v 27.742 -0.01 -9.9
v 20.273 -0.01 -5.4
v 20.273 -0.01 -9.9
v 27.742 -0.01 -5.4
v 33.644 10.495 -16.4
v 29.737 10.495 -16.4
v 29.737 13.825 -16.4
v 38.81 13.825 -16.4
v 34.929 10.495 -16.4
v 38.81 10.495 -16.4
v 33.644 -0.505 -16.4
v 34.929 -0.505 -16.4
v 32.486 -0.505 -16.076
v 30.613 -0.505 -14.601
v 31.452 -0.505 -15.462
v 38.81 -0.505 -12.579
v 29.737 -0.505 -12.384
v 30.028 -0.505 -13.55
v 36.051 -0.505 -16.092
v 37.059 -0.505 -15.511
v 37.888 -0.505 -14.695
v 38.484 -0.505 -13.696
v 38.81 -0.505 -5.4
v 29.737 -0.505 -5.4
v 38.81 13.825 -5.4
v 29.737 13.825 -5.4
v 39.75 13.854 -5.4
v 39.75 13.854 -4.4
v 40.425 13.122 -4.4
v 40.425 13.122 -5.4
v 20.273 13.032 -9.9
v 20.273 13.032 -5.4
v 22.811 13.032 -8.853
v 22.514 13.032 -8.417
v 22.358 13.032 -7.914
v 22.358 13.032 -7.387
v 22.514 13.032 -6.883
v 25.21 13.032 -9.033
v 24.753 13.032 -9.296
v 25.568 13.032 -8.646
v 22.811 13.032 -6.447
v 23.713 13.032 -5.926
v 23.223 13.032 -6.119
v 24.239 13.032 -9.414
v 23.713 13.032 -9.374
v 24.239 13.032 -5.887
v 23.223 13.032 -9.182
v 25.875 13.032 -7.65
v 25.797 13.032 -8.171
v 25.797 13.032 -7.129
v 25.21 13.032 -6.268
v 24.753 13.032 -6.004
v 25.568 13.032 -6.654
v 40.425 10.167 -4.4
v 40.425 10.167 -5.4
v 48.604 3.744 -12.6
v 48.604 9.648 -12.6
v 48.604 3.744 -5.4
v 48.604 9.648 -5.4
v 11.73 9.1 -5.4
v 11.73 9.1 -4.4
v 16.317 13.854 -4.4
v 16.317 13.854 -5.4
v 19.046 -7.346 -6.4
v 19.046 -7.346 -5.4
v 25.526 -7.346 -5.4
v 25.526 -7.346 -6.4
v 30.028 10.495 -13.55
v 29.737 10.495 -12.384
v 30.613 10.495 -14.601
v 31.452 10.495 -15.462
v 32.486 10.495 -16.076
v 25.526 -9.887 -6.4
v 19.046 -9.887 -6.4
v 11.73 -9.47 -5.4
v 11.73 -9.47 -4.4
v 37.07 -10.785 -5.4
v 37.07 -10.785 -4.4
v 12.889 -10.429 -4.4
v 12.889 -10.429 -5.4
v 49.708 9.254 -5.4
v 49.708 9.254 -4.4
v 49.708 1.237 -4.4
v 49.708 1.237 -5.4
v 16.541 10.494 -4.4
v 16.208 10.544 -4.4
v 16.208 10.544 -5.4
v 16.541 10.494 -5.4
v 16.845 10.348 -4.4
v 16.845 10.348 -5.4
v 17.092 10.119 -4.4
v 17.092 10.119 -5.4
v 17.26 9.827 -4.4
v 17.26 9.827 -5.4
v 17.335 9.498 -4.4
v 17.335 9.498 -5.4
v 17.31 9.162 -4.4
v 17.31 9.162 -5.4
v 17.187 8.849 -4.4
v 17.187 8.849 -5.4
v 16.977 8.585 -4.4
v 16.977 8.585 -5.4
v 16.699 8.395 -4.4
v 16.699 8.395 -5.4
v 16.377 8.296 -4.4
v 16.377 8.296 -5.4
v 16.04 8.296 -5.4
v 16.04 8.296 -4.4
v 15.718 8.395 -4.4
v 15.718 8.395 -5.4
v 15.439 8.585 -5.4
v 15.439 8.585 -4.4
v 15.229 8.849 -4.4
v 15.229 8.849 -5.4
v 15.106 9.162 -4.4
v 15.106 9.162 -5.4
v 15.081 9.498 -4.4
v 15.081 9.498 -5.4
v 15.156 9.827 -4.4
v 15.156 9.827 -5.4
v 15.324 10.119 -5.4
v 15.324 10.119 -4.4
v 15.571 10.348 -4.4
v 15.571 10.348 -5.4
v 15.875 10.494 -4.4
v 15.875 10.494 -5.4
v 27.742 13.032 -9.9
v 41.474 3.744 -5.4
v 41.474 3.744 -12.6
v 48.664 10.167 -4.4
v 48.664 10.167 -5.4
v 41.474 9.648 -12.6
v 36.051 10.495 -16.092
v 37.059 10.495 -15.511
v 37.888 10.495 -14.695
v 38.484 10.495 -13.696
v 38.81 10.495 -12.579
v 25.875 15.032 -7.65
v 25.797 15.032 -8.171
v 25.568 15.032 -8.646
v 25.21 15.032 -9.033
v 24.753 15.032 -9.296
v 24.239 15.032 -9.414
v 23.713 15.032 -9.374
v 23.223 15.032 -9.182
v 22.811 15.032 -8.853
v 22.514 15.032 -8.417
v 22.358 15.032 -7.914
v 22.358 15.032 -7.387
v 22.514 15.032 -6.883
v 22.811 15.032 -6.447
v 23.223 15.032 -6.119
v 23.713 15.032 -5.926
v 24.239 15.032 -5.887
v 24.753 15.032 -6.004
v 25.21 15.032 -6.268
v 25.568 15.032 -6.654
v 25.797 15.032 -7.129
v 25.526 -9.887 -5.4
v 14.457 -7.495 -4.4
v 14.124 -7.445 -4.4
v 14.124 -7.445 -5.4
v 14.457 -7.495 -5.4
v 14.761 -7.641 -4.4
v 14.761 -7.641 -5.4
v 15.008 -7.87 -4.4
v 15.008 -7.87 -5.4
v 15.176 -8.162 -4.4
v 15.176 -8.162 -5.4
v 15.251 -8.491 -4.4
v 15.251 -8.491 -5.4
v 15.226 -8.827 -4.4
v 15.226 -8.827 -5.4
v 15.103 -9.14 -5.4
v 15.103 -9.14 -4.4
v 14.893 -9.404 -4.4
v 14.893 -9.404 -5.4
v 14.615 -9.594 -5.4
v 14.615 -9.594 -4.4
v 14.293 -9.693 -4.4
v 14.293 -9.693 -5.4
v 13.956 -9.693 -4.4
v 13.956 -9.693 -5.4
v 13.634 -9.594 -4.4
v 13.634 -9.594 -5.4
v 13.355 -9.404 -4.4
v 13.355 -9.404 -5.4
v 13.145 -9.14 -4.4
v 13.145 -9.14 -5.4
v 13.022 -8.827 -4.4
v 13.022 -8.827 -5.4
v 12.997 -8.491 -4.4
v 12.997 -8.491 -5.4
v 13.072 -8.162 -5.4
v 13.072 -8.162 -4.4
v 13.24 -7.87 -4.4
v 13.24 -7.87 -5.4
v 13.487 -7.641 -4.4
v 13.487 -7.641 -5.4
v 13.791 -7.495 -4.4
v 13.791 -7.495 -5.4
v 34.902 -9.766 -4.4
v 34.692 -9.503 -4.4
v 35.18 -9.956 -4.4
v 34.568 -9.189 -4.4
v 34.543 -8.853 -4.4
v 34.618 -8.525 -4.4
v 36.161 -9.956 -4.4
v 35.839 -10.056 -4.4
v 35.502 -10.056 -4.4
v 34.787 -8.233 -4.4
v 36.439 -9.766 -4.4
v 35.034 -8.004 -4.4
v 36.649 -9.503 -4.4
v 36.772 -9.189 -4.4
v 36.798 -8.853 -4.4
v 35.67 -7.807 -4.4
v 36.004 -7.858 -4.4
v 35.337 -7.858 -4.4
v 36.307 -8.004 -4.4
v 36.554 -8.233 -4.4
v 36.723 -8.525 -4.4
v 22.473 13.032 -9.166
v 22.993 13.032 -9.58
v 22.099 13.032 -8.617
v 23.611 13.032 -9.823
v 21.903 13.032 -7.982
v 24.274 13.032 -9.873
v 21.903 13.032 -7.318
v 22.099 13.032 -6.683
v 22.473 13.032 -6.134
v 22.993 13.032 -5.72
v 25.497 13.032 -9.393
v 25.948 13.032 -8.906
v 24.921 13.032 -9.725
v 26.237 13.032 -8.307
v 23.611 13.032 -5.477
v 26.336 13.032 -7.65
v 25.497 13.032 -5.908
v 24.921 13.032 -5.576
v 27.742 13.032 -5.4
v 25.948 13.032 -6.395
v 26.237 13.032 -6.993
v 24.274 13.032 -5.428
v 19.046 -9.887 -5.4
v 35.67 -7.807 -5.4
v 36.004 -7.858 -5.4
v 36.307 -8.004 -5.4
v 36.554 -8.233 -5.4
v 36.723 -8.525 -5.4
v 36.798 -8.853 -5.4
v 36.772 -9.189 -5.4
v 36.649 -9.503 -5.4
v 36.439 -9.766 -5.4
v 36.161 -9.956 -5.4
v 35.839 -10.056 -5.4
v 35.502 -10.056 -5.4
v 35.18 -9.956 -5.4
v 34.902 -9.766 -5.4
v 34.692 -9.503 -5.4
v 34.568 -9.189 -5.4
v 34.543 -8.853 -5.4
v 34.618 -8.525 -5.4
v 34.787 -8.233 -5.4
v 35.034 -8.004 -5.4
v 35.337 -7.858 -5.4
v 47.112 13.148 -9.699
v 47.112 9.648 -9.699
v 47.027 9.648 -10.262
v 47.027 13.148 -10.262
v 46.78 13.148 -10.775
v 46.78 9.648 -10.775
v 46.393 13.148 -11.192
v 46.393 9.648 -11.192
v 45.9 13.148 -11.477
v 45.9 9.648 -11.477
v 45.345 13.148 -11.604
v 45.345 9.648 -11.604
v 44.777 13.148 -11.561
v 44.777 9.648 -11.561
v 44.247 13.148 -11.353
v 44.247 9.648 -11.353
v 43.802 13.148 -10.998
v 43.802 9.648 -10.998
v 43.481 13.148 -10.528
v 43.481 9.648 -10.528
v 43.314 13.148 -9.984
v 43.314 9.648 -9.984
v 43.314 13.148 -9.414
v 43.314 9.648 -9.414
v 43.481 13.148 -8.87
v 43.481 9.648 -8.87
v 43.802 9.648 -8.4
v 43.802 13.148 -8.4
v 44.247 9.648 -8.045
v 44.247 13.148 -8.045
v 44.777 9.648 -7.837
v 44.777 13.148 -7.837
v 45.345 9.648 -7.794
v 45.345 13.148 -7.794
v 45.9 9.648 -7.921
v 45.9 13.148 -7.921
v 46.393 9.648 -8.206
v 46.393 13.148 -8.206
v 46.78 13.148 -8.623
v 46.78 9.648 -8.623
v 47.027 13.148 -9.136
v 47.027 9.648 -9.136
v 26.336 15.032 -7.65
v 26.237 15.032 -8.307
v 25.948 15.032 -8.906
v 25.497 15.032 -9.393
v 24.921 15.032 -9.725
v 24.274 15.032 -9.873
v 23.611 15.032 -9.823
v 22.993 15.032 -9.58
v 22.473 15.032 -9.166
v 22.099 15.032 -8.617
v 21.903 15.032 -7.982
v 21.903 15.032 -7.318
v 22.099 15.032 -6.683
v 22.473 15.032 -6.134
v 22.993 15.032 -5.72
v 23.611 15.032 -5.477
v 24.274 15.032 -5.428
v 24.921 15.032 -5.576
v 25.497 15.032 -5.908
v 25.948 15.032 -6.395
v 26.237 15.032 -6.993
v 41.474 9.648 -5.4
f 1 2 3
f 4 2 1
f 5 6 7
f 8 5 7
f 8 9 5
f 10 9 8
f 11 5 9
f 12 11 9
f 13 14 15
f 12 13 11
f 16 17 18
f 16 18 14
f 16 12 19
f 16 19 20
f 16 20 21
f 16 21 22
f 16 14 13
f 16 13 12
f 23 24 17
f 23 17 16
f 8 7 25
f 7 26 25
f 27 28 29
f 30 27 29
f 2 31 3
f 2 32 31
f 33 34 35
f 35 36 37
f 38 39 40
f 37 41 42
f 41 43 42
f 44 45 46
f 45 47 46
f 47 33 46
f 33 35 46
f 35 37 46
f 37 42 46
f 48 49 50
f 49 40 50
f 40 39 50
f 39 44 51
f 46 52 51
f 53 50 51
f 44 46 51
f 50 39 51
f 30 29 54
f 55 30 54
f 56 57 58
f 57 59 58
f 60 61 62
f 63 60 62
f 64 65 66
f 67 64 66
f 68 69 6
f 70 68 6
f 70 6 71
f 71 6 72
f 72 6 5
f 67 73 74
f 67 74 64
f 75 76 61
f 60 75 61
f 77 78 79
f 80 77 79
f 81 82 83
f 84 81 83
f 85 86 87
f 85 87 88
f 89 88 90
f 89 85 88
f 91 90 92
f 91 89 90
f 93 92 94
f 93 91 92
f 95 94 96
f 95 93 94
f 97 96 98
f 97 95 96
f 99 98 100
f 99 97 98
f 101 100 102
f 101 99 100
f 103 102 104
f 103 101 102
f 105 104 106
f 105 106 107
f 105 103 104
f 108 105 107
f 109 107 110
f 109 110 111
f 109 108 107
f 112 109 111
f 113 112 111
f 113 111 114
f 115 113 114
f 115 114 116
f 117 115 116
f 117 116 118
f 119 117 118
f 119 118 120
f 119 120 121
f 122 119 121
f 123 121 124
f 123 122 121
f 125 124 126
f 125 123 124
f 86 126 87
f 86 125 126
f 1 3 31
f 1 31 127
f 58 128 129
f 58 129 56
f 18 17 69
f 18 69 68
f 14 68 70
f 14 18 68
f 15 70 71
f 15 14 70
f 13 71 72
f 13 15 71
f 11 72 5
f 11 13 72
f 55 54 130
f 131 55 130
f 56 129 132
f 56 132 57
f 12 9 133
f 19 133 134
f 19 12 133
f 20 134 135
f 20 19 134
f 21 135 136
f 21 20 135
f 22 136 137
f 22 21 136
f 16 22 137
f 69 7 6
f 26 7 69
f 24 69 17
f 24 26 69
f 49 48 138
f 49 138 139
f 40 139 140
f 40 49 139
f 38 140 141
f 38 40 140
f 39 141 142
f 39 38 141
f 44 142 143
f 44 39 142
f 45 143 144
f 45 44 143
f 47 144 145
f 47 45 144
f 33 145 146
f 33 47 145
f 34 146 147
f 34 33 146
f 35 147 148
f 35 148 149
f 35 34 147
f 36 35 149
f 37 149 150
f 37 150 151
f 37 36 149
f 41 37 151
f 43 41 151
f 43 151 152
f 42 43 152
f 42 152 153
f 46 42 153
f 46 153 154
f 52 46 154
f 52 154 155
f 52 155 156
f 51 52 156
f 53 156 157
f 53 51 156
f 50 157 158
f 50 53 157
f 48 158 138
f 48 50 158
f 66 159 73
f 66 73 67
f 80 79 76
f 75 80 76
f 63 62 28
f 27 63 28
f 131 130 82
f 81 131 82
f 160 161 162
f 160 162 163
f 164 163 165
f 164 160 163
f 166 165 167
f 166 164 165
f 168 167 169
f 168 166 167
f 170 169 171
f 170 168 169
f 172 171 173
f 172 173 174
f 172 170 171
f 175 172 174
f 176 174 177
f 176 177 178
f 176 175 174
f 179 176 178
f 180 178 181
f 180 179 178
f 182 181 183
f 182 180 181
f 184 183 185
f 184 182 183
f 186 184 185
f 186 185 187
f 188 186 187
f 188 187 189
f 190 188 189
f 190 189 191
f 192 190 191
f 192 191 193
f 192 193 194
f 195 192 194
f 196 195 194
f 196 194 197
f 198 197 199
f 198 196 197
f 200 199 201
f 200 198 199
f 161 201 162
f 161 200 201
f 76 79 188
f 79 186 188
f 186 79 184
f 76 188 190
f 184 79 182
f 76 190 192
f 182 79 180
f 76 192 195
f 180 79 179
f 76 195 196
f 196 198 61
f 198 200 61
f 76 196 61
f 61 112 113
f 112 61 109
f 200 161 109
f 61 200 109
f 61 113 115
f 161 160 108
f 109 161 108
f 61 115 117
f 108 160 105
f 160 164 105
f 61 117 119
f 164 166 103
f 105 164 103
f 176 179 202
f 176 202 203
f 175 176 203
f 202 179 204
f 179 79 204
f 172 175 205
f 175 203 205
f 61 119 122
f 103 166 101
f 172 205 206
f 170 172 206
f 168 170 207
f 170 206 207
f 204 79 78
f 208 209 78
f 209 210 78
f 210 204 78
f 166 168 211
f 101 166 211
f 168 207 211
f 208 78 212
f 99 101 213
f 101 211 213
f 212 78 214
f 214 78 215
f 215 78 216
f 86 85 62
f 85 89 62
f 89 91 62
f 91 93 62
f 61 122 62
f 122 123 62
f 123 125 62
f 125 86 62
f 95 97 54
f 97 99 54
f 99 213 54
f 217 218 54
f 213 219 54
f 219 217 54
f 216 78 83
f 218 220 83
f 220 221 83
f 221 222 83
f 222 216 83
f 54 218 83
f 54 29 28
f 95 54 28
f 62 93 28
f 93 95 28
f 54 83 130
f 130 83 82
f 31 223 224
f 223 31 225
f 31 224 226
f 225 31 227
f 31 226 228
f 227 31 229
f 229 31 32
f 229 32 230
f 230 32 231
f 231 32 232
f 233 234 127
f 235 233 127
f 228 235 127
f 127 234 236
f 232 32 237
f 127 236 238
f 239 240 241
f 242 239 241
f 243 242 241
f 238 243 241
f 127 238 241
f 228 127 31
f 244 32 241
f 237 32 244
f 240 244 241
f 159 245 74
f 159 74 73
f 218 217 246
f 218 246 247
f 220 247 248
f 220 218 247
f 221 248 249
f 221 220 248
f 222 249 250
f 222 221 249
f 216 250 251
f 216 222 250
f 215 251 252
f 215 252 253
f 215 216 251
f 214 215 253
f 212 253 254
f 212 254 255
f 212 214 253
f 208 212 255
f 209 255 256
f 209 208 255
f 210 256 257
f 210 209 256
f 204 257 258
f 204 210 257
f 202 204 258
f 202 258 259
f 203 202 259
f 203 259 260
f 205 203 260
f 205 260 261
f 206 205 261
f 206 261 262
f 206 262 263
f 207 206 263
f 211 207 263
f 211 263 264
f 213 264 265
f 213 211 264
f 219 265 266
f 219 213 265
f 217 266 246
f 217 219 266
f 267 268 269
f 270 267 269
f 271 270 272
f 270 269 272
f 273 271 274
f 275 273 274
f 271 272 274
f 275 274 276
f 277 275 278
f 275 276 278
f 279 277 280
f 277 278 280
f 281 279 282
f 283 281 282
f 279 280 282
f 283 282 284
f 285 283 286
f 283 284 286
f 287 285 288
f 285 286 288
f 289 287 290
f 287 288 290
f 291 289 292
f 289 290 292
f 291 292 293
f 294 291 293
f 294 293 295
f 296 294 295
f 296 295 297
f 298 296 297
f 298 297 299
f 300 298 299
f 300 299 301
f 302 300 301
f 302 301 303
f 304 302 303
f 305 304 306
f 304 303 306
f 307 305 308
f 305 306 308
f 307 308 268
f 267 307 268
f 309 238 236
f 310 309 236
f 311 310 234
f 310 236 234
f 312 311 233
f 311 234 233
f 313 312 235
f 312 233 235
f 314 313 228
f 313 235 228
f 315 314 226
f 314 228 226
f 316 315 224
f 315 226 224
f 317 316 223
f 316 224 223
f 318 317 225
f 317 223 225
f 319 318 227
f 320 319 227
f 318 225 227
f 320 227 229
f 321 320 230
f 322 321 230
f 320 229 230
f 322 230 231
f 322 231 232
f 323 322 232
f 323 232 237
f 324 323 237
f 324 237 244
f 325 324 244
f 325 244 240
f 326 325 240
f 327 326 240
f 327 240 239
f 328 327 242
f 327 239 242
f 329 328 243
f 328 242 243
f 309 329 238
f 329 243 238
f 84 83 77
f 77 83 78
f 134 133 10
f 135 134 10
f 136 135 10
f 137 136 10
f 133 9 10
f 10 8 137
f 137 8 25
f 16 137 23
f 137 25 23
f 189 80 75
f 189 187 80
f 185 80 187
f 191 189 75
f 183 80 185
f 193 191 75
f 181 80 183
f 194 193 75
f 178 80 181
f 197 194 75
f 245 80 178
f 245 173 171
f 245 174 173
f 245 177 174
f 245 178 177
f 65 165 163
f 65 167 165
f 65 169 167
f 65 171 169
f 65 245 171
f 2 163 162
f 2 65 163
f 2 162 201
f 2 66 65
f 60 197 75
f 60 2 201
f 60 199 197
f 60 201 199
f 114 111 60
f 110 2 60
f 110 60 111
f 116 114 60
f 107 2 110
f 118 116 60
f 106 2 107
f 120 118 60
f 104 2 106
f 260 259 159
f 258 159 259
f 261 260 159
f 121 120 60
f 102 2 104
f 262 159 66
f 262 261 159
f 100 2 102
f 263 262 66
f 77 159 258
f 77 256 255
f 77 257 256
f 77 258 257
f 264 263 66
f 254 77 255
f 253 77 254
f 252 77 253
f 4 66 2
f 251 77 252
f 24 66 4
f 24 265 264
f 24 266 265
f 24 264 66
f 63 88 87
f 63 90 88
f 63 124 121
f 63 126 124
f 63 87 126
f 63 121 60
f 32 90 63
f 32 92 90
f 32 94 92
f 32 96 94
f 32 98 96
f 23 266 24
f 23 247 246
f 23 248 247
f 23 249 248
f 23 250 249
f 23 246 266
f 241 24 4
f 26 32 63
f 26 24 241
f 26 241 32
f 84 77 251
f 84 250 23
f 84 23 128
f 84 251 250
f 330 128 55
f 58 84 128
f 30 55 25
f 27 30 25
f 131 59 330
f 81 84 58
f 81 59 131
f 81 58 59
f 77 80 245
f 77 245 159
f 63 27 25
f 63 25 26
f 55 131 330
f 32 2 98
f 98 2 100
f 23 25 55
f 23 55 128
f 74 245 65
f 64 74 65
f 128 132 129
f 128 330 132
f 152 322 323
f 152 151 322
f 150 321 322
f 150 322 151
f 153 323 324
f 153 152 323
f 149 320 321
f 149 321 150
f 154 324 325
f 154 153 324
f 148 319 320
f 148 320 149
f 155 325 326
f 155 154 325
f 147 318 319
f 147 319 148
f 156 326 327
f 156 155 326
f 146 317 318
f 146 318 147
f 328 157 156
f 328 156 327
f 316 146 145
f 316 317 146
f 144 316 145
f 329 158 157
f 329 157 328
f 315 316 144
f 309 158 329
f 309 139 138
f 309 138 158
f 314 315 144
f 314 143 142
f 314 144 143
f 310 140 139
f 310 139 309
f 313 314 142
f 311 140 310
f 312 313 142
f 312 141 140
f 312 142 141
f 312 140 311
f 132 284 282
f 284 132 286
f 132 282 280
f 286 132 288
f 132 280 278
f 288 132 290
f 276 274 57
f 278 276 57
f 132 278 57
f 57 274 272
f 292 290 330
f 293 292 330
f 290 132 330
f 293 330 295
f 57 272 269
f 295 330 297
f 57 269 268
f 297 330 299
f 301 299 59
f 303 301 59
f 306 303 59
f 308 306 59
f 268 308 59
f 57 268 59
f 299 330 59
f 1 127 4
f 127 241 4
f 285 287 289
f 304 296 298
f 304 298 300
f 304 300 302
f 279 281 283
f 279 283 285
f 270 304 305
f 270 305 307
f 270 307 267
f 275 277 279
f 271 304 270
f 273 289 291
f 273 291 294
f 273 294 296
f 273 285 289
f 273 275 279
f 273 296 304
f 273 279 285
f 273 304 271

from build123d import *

# Parameters (mm, degrees)
SKETCH019_R             = 1.130326
PAD016_DEPTH            = 1
SKETCH020_W             = 5.904956
SKETCH020_H             = 7.129152
SKETCH020_W_2           = 14.33032
SKETCH020_H_2           = 9.073469
SKETCH020_W_3           = 13.041881
SKETCH020_H_3           = 7.469439
SKETCH020_W_4           = 2.541733
SKETCH020_H_4           = 6.479892
PAD017_DEPTH            = 1
PAD017_FACE36_W         = 7.129152
PAD017_FACE36_H         = 5.904956
PAD018_DEPTH            = 6.2
PAD018_FACE35_W         = 9.073469
PAD018_FACE35_H         = 14.33032
PAD019_DEPTH            = 10
PAD019_FACE34_W         = 7.469439
PAD019_FACE34_H         = 13.041881
PAD020_DEPTH            = 3.5
POCKET003_DEPTH         = 11
SKETCH022_R             = 1.91
PAD021_DEPTH            = 3.5
SKETCH023_R             = 2.22864
SKETCH023_R_2           = 1.768375
PAD022_DEPTH            = 2
BODY003_ROLL_ANGLE      = 180
BODY003_PLACEMENT_ANGLE = 90


with BuildPart() as part:
    # Sketch019 → Pad016 (new body)
    with BuildSketch(Plane.XY):
        Polygon((-15.284975, 18.270082), (-14.928669, -5.910554), (-13.97018, -7.070244), (4.600039, -7.070244), (9.354287, -2.482894), (9.354287, 20.950066), (8.622145, 21.624855), (5.667069, 21.624855), (5.667069, 29.864458), (4.754071, 30.908138), (-3.262787, 30.908138), align=None)
        with Locations((-13.437825, 16.870399)):
            Circle(SKETCH019_R, mode=Mode.SUBTRACT)
        with Locations((-13.075155, -4.675778)):
            Circle(SKETCH019_R, mode=Mode.SUBTRACT)
        with Locations((4.913836, -2.591921)):
            Circle(SKETCH019_R, mode=Mode.SUBTRACT)
    extrude(amount=PAD016_DEPTH)

    # Sketch020 (on Face16 of Pad016) → Pad017 (join)
    with BuildSketch(Plane.XY.offset(1)):
        with Locations((2.196002, 26.239064)):
            Rectangle(SKETCH020_W, SKETCH020_H)
        with Locations((2.159996, 15.4733225)):
            Rectangle(SKETCH020_W_2, SKETCH020_H_2)
        with Locations((2.0113995, 5.2073215)):
            Rectangle(SKETCH020_W_3, SKETCH020_H_3)
        with Locations((-13.1164825, 3.486279)):
            Rectangle(SKETCH020_W_4, SKETCH020_H_4)
    extrude(amount=PAD017_DEPTH)

    # Pad017 Face36 → Pad018 (add)
    with BuildSketch(Plane(origin=(2.196002, 26.239064, 2), x_dir=(0, 1, 0), z_dir=(0, 0, 1))):
        Rectangle(PAD017_FACE36_W, PAD017_FACE36_H)
    extrude(amount=PAD018_DEPTH)

    # Pad018 Face35 → Pad019 (add)
    with BuildSketch(Plane(origin=(2.159996, 15.4733225, 2), x_dir=(0, 1, 0), z_dir=(0, 0, 1))):
        Rectangle(PAD018_FACE35_W, PAD018_FACE35_H)
    extrude(amount=PAD019_DEPTH)

    # Pad019 Face34 → Pad020 (add)
    with BuildSketch(Plane(origin=(2.0113995, 5.2073215, 2), x_dir=(0, 1, 0), z_dir=(0, 0, 1))):
        Rectangle(PAD019_FACE34_W, PAD019_FACE34_H)
    extrude(amount=PAD020_DEPTH)

    # Sketch021 (on Face38 of Pad020) → Pocket003 (cut)
    with BuildSketch(Plane(origin=(-5.005164, 0, 0), x_dir=(0, -1, 0), z_dir=(-1, 0, 0))):
        with BuildLine():
            ThreePointArc((-10.909353, 7.32661), (-15.4381290695, 12.0450982539), (-20.065739, 7.4235))
            Line((-20.065739, 7.4235), (-23.086145, 11.442731))
            Line((-23.086145, 11.442731), (-16.489733, 15.336999))
            Line((-16.489733, 15.336999), (-4.992367, 12.502396))
            Line((-4.992367, 12.502396), (-10.909353, 7.32661))
        make_face()
    extrude(amount=-POCKET003_DEPTH, mode=Mode.SUBTRACT)

    # Sketch022 (on Face44 of Pocket003) → Pad021 (join)
    with BuildSketch(Plane.YZ.offset(5.14848)):
        with Locations((26.402317, 5.299071)):
            Circle(SKETCH022_R)
    extrude(amount=PAD021_DEPTH)

    # Sketch023 (on Face36 of Pad021) → Pad022 (join)
    with BuildSketch(Plane.YZ.offset(8.53234)):
        with Locations((5.306993, 3.250137)):
            Circle(SKETCH023_R)
        with Locations((5.306993, 3.250137)):
            Circle(SKETCH023_R_2, mode=Mode.SUBTRACT)
    extrude(amount=PAD022_DEPTH)


with BuildPart() as part_1:
    # Body003 roll: moved
    add(part.part.rotate(Axis((0, 0, 0), (1, 0, 0)), BODY003_ROLL_ANGLE))


with BuildPart() as part_2:
    # Body003 placement: moved
    add(part_1.part.moved(Location((18.8, 4.5, -4.4))).rotate(Axis((18.8, 4.5, -4.4), (0, 0, 1)), BODY003_PLACEMENT_ANGLE))


solid = part_2.part
